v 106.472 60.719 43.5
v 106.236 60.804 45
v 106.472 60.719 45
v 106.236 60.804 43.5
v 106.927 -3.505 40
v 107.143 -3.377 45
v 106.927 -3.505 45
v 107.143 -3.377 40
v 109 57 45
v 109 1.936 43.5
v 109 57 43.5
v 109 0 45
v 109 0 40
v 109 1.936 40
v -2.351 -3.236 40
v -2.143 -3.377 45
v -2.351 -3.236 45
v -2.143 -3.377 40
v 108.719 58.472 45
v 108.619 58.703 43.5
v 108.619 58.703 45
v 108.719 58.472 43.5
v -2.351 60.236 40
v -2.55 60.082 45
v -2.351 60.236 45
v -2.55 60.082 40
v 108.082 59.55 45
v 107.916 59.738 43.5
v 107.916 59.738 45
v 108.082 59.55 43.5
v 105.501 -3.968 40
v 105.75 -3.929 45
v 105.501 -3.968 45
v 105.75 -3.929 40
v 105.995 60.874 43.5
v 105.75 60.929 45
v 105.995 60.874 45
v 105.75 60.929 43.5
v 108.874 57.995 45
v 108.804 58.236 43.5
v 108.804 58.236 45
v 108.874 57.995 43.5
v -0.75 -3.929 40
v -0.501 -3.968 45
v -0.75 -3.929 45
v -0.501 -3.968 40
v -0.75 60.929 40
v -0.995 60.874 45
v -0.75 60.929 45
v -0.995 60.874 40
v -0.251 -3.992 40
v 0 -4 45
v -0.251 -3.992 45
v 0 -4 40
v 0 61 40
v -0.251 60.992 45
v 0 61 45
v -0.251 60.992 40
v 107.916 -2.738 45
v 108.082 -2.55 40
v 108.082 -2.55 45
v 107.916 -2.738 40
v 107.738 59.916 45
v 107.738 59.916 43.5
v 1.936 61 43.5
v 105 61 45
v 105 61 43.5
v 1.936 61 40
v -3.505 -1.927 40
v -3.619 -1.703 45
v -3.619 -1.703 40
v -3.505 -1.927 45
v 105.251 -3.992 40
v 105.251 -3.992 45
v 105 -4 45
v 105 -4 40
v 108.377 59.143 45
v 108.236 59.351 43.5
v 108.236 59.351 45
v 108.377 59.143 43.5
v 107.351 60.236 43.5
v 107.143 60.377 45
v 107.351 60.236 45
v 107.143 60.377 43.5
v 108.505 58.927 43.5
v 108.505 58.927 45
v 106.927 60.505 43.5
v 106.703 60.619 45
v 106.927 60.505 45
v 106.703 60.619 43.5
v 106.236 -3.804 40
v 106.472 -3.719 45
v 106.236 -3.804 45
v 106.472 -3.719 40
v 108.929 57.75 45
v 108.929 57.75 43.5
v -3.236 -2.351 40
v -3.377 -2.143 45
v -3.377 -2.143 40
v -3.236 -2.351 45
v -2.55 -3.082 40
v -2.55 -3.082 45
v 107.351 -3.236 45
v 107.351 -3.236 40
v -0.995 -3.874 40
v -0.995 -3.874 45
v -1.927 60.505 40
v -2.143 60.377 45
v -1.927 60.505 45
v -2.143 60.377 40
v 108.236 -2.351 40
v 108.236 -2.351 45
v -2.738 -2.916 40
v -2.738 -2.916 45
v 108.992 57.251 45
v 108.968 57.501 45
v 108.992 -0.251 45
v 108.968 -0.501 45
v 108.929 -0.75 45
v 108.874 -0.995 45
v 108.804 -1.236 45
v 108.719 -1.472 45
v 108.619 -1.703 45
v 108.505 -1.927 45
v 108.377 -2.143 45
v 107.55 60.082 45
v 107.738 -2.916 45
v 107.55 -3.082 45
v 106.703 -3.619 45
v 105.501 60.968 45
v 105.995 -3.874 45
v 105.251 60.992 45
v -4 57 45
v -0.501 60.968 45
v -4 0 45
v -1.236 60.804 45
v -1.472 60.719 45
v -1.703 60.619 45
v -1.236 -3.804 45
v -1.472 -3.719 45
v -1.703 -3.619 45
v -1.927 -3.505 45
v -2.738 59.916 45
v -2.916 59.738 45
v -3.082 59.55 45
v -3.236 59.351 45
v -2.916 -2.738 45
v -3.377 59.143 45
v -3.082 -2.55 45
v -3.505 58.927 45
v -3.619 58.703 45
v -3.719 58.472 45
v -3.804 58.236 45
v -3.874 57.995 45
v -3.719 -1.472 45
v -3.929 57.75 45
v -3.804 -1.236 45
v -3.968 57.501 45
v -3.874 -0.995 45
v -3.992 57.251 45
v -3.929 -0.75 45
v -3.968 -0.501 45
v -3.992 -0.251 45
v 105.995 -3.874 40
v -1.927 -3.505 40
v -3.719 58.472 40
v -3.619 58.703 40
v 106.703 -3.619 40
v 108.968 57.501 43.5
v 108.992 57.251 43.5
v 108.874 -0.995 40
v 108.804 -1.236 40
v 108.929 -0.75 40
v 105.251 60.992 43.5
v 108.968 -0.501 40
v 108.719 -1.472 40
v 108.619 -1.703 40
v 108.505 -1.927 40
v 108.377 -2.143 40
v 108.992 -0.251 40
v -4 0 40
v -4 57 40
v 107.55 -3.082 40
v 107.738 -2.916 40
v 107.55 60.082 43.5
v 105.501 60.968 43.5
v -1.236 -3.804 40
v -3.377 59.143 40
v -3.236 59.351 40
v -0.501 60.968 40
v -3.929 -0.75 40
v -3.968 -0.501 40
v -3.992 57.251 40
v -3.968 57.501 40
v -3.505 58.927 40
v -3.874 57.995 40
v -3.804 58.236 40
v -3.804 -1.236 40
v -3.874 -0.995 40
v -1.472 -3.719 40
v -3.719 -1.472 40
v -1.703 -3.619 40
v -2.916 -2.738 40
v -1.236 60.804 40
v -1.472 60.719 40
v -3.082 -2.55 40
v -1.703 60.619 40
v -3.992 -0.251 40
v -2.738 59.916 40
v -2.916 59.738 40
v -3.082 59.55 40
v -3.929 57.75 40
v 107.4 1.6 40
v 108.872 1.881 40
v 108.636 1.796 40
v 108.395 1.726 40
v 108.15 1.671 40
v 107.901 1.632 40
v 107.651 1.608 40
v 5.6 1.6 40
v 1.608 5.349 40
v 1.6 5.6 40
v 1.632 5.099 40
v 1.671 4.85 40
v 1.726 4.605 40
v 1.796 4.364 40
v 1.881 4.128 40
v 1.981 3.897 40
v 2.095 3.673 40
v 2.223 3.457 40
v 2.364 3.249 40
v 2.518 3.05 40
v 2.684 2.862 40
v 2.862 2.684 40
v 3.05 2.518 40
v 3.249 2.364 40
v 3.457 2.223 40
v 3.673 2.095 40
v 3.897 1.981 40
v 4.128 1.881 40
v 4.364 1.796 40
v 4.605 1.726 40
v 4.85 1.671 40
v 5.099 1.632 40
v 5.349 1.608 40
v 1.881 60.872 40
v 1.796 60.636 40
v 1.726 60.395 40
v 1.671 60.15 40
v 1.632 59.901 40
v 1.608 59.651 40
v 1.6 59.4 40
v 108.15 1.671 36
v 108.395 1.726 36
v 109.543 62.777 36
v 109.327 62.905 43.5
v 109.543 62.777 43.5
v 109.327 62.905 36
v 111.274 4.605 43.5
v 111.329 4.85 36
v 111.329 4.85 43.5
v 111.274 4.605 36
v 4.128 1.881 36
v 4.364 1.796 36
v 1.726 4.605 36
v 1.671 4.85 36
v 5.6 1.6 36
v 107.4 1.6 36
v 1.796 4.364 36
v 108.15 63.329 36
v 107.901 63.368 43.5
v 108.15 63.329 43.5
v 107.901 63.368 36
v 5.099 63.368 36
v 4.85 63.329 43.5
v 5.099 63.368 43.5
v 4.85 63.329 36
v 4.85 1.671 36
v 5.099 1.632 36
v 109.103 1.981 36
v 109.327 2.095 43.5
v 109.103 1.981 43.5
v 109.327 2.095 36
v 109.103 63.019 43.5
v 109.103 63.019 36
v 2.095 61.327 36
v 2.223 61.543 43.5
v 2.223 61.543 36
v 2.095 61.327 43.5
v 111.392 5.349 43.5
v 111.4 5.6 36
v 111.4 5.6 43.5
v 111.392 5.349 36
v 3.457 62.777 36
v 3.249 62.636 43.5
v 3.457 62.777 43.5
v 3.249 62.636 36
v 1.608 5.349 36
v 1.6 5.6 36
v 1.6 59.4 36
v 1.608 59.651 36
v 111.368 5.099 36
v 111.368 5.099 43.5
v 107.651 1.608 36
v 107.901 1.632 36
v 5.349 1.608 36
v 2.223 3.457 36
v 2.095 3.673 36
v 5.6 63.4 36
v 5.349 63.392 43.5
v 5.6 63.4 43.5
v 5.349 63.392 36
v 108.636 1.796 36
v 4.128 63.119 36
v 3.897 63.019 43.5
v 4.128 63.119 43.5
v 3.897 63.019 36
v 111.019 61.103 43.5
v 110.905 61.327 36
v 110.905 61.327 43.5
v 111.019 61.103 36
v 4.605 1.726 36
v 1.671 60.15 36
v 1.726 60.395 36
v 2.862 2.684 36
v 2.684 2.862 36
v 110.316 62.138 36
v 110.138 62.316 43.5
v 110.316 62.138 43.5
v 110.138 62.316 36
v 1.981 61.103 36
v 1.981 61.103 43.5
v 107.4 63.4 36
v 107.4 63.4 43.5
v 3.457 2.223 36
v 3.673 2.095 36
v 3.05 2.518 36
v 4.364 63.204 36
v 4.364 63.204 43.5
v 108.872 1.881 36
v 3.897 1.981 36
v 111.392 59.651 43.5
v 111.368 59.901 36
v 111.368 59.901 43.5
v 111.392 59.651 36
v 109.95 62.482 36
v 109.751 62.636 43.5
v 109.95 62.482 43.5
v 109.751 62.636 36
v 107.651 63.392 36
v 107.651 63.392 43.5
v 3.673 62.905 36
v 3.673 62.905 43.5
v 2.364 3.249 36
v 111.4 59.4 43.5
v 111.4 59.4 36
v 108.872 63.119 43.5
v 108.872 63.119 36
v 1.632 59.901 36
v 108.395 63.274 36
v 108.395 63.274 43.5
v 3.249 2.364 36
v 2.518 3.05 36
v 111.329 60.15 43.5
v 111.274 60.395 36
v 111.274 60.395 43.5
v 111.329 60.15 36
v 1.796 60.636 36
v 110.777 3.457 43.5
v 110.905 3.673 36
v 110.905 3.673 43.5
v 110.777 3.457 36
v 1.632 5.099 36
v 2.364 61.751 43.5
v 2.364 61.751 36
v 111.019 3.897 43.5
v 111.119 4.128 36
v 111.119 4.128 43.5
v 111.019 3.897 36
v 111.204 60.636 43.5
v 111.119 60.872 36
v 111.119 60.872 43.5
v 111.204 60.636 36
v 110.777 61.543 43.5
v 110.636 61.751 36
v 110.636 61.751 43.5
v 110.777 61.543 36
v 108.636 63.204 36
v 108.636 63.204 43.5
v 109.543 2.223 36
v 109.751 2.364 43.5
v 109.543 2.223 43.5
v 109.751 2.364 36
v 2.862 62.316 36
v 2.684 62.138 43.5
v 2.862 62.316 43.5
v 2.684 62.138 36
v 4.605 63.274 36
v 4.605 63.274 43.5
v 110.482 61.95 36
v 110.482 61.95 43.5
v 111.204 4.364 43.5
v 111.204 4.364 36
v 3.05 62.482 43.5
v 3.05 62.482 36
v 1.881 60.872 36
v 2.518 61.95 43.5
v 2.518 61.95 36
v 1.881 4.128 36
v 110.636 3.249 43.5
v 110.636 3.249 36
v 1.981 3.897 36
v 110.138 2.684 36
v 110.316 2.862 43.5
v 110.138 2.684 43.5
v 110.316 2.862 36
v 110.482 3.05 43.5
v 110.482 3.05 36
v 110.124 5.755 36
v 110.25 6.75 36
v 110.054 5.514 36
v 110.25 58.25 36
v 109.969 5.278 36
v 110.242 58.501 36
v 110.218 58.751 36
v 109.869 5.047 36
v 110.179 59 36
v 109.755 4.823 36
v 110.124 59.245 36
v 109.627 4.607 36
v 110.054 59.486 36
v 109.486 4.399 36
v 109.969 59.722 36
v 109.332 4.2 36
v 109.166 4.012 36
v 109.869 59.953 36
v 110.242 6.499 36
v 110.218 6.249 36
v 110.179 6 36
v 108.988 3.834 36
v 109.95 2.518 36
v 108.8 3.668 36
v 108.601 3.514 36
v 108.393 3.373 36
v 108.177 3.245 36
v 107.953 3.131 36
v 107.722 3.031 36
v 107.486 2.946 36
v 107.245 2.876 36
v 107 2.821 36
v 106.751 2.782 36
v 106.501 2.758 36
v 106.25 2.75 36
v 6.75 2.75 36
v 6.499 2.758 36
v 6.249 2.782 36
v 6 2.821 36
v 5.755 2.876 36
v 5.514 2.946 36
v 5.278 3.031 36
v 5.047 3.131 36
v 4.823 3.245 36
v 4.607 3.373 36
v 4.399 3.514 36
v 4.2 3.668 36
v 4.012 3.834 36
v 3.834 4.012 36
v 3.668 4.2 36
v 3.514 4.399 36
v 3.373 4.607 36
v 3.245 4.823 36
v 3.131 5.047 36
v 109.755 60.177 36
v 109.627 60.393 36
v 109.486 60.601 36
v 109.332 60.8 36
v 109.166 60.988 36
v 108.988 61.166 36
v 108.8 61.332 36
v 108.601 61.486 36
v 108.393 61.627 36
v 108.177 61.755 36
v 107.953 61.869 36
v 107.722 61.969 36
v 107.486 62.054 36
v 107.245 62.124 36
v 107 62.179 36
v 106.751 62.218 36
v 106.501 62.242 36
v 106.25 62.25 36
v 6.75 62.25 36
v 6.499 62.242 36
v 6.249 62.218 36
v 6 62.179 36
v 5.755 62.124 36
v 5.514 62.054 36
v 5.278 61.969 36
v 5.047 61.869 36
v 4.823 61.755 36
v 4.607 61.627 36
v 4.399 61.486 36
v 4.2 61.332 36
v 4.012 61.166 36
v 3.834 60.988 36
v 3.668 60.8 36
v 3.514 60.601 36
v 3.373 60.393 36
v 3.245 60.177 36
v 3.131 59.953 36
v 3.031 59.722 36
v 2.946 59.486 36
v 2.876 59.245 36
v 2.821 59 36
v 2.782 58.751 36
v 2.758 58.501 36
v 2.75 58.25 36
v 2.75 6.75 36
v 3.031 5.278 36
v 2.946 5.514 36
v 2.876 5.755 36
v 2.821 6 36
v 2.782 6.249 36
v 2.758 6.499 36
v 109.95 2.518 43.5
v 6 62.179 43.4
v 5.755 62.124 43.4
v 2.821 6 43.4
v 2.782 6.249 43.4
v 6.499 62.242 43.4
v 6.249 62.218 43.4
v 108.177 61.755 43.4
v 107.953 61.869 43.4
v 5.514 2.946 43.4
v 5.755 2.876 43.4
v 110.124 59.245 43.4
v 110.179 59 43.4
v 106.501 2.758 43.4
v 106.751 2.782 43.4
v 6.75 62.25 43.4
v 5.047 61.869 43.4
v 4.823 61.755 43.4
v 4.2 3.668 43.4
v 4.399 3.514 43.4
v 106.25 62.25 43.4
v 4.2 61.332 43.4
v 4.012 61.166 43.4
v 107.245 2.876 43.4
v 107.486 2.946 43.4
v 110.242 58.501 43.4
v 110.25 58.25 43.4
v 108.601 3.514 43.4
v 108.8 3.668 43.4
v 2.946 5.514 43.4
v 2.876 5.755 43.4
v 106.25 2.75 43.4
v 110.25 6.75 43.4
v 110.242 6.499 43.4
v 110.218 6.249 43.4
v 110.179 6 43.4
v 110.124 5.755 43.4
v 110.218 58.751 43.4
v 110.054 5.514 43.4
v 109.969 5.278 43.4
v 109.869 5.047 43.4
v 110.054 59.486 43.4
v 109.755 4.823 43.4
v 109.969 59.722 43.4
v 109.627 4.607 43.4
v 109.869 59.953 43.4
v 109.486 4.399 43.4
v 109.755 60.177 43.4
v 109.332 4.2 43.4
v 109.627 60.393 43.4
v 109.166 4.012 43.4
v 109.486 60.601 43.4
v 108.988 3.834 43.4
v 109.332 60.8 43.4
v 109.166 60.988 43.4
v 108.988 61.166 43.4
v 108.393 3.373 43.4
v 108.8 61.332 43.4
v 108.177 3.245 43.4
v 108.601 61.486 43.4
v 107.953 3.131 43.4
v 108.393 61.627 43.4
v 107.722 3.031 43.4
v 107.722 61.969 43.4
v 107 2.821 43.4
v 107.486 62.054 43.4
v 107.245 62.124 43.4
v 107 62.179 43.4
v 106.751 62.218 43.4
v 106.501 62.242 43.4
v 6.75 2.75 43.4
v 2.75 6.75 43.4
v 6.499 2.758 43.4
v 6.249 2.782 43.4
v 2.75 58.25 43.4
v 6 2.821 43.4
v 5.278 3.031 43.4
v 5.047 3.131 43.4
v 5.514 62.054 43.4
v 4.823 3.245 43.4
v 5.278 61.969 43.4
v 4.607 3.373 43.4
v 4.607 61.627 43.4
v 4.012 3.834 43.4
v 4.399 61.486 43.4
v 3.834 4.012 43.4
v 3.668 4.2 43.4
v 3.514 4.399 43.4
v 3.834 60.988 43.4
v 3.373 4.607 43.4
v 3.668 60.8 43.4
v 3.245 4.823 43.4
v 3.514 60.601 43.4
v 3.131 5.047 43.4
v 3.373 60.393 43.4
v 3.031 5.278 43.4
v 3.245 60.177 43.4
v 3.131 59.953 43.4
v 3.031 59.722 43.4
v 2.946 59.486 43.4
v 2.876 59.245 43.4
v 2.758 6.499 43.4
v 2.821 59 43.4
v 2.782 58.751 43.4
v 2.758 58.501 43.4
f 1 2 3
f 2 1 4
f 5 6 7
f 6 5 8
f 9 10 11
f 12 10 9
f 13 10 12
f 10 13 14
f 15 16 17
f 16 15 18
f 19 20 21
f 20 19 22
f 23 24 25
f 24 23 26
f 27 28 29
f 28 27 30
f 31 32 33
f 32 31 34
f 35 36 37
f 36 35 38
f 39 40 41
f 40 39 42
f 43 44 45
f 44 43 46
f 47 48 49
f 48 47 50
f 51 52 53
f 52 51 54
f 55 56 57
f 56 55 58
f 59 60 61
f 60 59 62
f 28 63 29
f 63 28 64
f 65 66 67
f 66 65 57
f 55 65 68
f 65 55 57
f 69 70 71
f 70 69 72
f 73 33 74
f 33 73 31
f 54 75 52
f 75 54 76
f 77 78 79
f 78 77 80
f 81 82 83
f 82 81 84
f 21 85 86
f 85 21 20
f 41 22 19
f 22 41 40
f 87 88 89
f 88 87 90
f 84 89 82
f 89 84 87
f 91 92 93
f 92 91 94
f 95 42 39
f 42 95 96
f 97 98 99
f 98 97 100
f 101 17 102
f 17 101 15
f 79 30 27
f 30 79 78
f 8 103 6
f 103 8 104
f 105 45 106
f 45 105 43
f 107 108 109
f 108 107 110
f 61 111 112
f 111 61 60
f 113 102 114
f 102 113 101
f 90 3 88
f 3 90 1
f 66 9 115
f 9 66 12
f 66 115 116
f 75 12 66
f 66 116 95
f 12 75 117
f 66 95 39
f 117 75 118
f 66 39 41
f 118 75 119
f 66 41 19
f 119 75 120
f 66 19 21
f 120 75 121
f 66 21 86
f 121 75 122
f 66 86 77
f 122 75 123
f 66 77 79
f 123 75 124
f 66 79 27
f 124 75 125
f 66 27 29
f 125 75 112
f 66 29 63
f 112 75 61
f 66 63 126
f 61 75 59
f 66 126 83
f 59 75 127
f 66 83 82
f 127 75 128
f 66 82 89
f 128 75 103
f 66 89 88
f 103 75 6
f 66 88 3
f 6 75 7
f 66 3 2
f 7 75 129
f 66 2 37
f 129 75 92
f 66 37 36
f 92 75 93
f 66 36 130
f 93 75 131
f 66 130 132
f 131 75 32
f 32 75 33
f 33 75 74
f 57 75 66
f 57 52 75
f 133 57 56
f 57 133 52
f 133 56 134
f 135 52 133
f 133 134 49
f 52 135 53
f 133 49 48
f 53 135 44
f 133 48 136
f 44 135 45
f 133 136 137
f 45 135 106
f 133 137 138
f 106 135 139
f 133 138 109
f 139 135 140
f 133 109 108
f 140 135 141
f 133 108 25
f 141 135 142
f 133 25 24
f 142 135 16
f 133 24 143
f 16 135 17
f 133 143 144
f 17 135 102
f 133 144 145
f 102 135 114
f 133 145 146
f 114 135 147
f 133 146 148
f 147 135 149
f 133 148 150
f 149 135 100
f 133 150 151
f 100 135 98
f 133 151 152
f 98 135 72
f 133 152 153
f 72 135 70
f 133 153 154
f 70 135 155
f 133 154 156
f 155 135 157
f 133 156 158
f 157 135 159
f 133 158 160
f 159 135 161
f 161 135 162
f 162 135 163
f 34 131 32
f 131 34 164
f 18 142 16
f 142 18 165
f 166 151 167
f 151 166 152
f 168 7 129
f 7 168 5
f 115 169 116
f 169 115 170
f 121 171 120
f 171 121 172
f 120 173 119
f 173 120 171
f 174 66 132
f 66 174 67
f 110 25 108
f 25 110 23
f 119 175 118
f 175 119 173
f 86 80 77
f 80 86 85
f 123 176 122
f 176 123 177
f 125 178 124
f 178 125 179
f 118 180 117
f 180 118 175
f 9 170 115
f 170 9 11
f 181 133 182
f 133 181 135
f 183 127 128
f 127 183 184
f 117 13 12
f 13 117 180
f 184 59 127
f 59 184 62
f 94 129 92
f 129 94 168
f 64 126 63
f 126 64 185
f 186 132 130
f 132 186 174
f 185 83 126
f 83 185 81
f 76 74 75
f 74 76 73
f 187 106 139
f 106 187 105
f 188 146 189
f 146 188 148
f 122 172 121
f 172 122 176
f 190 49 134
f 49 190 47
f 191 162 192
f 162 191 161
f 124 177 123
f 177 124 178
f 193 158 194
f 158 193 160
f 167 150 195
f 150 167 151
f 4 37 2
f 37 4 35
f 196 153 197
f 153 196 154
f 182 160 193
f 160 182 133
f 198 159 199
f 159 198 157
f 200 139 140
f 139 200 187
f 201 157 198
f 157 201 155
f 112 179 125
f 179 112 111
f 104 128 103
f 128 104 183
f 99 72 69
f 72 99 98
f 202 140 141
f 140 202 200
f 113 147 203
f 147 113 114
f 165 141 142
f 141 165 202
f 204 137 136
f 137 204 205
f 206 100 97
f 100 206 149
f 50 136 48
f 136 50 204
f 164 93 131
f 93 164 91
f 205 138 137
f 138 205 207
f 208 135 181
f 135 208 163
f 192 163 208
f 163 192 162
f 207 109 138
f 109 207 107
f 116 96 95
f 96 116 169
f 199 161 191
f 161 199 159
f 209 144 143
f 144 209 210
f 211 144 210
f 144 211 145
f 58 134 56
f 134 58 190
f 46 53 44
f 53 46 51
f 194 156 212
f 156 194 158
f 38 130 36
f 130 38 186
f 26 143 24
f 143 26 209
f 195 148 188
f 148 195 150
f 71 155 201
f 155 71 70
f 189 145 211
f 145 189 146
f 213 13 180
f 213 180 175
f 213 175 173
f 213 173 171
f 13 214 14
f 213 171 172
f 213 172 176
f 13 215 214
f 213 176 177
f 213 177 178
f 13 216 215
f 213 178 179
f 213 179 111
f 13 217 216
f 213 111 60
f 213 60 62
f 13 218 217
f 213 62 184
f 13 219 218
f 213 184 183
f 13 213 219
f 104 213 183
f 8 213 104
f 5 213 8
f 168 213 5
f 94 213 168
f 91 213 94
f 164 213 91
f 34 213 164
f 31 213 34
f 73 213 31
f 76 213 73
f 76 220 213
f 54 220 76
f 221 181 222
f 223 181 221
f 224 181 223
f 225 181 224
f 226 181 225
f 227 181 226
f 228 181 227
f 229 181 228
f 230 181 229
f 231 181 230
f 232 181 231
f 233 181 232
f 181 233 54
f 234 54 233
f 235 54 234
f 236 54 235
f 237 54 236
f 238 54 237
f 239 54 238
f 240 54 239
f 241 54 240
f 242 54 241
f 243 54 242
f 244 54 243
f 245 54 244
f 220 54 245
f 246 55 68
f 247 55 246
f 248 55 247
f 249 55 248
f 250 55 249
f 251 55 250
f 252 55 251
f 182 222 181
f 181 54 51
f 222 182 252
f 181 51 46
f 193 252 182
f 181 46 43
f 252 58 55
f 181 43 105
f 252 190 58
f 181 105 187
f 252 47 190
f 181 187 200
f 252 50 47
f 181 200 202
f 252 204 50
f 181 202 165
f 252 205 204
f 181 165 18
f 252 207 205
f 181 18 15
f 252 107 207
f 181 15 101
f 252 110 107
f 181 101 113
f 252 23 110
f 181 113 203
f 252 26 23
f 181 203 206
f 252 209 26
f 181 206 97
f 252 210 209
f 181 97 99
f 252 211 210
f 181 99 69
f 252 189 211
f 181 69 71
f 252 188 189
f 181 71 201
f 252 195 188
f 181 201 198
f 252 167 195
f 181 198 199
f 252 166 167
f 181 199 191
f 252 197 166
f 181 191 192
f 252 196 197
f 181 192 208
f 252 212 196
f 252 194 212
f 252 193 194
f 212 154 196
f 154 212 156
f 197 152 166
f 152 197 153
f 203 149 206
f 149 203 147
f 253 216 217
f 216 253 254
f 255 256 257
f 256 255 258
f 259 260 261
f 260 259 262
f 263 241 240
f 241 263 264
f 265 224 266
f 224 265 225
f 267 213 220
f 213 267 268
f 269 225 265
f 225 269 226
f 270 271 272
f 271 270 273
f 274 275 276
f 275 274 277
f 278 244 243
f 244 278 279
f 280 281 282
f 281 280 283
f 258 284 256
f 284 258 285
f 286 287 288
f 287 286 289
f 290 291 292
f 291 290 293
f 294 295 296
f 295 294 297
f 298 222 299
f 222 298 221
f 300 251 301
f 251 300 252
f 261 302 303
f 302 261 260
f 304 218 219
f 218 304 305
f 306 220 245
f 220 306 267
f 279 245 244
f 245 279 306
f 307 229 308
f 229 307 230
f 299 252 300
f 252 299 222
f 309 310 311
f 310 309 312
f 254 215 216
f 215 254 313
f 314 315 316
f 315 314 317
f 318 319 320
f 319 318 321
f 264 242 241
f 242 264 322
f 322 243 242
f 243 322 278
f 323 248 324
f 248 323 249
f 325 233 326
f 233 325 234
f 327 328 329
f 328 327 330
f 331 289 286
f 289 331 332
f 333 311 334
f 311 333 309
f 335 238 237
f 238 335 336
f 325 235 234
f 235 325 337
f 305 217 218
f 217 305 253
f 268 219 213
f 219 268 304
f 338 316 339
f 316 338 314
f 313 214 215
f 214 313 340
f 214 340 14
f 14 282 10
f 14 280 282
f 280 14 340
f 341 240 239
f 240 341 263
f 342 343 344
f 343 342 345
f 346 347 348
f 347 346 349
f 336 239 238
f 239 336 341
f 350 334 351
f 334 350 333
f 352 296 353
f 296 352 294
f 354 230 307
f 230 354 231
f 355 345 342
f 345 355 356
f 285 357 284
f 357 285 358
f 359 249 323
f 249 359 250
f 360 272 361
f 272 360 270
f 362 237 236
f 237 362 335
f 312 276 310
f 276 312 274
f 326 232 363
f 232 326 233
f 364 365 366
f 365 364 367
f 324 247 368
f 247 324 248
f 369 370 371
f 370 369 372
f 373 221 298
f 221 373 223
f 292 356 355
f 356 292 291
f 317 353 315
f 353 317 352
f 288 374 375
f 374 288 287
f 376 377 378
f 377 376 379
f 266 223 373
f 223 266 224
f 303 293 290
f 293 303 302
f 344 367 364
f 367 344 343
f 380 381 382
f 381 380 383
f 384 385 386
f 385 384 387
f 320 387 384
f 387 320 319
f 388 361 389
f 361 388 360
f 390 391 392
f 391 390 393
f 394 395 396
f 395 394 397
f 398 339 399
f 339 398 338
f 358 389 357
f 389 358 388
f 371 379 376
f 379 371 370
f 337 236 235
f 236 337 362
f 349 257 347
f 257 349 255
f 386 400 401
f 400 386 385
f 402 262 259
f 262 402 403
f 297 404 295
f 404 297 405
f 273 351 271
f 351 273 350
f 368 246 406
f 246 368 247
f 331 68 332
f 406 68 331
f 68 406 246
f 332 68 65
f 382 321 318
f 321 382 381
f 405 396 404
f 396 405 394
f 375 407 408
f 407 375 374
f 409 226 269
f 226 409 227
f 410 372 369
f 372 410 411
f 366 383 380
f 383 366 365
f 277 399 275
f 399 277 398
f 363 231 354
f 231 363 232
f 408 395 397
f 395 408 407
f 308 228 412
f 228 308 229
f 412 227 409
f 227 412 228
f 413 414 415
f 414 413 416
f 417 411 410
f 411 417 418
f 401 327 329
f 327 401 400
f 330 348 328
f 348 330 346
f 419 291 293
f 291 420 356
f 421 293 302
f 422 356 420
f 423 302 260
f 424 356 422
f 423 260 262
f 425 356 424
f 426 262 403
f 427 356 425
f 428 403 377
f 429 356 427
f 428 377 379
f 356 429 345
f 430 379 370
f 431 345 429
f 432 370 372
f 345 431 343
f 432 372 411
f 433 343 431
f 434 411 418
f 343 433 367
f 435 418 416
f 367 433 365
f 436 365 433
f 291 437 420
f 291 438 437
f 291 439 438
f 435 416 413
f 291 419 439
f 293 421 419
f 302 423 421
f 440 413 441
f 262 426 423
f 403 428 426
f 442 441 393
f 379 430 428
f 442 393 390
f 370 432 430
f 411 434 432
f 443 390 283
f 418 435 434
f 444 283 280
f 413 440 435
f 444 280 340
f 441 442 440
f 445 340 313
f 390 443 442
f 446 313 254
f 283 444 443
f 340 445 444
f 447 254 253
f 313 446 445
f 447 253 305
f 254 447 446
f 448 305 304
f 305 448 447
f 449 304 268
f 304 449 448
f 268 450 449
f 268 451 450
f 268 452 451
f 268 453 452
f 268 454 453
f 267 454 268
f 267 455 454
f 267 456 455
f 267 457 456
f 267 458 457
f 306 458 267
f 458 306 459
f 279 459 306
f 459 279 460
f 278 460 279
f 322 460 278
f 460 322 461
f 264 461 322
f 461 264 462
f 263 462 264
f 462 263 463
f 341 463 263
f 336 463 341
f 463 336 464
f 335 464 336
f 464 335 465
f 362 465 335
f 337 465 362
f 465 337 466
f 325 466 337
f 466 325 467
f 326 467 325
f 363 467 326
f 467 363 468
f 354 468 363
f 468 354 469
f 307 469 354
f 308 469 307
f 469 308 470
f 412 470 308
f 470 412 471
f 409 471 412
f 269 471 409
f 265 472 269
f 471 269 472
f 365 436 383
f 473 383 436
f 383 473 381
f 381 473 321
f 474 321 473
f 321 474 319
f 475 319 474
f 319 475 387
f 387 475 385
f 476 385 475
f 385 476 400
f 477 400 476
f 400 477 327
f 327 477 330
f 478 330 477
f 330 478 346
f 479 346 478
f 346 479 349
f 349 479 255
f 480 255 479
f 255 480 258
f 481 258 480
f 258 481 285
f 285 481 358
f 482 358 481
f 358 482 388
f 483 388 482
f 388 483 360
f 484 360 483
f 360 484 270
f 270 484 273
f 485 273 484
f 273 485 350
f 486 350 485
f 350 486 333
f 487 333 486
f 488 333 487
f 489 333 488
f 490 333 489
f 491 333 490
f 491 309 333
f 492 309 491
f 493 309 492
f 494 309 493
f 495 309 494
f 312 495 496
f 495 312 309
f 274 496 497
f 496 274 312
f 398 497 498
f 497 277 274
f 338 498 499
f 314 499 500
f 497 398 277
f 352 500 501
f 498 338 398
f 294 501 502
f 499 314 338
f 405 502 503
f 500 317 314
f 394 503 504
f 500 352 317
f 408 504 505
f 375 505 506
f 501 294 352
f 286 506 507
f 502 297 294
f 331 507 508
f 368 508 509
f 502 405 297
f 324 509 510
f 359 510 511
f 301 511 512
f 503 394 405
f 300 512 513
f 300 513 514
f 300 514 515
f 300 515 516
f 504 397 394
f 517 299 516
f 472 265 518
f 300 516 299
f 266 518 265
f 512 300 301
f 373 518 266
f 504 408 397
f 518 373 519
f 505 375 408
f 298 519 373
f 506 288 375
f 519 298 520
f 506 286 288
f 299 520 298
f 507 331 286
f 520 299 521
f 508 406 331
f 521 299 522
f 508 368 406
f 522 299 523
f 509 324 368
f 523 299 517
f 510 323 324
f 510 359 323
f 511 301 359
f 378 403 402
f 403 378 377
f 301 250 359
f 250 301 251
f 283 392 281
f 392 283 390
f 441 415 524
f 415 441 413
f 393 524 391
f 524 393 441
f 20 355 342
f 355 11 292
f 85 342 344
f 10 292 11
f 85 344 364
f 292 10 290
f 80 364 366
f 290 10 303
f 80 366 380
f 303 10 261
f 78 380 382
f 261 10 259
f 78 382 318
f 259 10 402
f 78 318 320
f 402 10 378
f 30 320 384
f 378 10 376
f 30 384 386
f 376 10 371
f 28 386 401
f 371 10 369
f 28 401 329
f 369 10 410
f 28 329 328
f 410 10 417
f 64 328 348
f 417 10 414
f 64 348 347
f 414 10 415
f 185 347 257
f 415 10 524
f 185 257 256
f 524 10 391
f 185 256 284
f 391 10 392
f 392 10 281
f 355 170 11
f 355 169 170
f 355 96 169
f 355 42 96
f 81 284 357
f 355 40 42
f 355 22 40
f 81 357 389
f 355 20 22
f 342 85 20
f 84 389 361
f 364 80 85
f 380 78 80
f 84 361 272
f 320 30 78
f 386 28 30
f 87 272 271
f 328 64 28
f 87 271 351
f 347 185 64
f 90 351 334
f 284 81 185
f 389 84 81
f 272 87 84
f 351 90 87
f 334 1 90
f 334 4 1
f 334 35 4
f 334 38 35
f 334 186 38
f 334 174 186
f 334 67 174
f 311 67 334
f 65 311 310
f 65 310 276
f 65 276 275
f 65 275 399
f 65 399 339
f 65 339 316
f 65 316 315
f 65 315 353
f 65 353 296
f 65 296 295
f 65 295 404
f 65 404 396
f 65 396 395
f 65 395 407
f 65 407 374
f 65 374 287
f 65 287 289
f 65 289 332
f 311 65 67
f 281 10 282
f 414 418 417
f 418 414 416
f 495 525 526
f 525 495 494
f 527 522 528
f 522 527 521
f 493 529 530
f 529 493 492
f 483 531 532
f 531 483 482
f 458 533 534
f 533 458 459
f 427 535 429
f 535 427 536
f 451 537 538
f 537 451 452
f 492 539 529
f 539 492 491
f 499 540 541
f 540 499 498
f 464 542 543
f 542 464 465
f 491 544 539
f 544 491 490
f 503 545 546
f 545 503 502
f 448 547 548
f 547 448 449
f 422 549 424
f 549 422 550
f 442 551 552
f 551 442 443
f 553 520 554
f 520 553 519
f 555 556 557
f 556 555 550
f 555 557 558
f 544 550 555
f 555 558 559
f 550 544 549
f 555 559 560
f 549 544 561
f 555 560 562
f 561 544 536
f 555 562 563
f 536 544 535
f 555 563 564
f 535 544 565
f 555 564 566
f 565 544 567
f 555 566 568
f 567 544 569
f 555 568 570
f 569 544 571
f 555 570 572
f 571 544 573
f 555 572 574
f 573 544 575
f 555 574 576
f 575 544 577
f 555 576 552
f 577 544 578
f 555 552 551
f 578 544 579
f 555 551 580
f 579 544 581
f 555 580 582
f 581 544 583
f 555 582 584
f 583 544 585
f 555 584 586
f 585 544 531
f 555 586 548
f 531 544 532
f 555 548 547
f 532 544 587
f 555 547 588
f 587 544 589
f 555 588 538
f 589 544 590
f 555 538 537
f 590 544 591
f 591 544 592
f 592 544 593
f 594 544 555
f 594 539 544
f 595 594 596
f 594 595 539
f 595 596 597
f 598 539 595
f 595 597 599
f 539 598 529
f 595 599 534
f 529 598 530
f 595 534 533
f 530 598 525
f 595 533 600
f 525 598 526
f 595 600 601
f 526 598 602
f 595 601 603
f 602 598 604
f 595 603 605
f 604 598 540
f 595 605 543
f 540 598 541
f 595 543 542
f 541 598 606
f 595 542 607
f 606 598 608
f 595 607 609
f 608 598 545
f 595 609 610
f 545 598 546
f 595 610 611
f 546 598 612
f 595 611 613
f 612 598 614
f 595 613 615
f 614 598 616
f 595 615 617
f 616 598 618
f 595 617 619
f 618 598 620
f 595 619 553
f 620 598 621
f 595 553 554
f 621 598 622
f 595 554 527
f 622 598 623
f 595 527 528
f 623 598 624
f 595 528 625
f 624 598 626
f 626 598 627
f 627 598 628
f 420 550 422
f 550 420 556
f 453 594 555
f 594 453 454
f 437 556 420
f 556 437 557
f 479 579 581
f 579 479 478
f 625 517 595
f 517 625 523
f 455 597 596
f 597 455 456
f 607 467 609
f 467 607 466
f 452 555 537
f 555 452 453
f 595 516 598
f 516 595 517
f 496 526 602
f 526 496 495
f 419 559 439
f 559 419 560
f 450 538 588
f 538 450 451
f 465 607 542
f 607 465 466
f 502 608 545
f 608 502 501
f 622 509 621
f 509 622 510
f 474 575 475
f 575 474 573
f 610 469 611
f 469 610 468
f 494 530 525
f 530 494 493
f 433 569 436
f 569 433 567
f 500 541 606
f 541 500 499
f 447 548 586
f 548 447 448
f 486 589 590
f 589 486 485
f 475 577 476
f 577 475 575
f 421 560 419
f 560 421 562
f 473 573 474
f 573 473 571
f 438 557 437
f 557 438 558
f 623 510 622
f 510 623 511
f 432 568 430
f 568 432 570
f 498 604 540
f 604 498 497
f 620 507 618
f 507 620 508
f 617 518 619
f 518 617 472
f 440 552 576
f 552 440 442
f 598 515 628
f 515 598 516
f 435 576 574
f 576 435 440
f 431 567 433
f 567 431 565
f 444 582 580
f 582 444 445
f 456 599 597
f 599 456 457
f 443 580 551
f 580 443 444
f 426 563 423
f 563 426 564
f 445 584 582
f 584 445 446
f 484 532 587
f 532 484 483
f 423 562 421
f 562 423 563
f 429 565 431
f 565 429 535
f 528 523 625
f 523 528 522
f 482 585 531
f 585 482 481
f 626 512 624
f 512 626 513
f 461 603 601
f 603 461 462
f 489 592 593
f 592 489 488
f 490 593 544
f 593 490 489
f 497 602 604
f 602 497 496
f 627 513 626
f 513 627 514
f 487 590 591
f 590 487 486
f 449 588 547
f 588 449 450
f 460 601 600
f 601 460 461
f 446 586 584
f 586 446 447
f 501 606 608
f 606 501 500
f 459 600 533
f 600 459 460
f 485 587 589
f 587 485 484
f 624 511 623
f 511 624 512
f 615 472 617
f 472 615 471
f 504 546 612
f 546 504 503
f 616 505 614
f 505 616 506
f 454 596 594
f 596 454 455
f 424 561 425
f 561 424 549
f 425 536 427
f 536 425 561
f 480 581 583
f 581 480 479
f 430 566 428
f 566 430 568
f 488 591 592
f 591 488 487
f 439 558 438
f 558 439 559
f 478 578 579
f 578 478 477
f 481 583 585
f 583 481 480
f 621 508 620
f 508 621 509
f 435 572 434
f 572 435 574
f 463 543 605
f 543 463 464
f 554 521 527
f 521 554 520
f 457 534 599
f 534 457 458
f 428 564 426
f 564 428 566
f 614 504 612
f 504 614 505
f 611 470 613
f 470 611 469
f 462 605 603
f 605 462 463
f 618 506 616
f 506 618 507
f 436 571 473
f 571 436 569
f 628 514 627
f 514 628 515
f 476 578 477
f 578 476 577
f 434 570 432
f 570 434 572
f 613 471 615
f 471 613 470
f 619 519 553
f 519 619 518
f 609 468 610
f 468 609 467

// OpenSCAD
echo("Wide Feather ProtoType");

// Different feather boards might be longer.
// PCB is 50mm.
// PCB size needs to be correct for USB A middle point.
pcbHeight = 60;
pcbWidth = 100;
// How thick (deep) the PCB is (typically 1.6mm)
pcbThickness = 1.6;

pcbPaddingYAxis = 1;
pcbPaddingXAxis = 5; // 1mm from the wall.

// Support positions on the PCBs, relatec to the PCB corner.
// does not include bezel/wall thinckness offsets
pcbSupportPositions = [];
pcbSupportPadPositions = [[4,4,0],[96,46,0],[4,46,0],[96,4,0]];
//pcbSupportPinPositions = [[4,4,0],[96,46,0],[4,46,0],[96,4,0]];
pcbSupportPinPositions = [];
pcbSupportHeight = 17;

// How much above the USB A connector inlet to add the the base case height.
additionalBaseDepth = 10;

// Y start position and how far along
// Compute the X start and end based on case size
// Compute the Z start position base and size based on
// the support heights, base height, top height and cutout height required.
endCutoutYStartPosition = 10;
endCutoutHeight = 20;
// Overall Z height - shared between base and top
endCutoutZHeight = 8; 
includeEndCutout = false;

textPosition = [30,21,-3];
textText = "Feather";
includeText = false;
includeArialCutouts = false;

// battery....
showBattery = false;
includeBatteryCompartment = false;

// This will vary based on the ThingyStick
coverDepth = 5; 
//coverDepth = 6;  // Photon directly on the PCB.
echo("coverDepth (Z)" , coverDepth);

include <../ThingyStickCase.scad>;

module PcbHoleModel(x,y) {
    translate([x,y,-5]) {
        cylinder(d=3, h=10);
    }
}

// Note USB A plug is on RHS, but to make case easier
// use PCB upside-down
module PcbModel() {
    translate([2.5+4,2.5,15]) {
        cube([100,50,1.6]);
        PcbHoleModel(4,4);
        PcbHoleModel(96,46);
        PcbHoleModel(4,46);
        PcbHoleModel(96,4);
        
        translate([38.7, 0, -14]) {
            // 18.5mm high with headers.
            // 7mm without
            cube([23, 54, 14]);
        }
        
        
        translate([45, -10, -12]) {
            // USB B
            cube([10, 20, 4]);
        }
    }
}

module extraCutouts() {
    
    if (includeUsbPlugCutout) {
              //  usbPlugCutout();
    }
    
    translate([46+4,-10, 1]) {
        #cube([13,15,8]);
    }
}

%PcbModel();
buildCase();
